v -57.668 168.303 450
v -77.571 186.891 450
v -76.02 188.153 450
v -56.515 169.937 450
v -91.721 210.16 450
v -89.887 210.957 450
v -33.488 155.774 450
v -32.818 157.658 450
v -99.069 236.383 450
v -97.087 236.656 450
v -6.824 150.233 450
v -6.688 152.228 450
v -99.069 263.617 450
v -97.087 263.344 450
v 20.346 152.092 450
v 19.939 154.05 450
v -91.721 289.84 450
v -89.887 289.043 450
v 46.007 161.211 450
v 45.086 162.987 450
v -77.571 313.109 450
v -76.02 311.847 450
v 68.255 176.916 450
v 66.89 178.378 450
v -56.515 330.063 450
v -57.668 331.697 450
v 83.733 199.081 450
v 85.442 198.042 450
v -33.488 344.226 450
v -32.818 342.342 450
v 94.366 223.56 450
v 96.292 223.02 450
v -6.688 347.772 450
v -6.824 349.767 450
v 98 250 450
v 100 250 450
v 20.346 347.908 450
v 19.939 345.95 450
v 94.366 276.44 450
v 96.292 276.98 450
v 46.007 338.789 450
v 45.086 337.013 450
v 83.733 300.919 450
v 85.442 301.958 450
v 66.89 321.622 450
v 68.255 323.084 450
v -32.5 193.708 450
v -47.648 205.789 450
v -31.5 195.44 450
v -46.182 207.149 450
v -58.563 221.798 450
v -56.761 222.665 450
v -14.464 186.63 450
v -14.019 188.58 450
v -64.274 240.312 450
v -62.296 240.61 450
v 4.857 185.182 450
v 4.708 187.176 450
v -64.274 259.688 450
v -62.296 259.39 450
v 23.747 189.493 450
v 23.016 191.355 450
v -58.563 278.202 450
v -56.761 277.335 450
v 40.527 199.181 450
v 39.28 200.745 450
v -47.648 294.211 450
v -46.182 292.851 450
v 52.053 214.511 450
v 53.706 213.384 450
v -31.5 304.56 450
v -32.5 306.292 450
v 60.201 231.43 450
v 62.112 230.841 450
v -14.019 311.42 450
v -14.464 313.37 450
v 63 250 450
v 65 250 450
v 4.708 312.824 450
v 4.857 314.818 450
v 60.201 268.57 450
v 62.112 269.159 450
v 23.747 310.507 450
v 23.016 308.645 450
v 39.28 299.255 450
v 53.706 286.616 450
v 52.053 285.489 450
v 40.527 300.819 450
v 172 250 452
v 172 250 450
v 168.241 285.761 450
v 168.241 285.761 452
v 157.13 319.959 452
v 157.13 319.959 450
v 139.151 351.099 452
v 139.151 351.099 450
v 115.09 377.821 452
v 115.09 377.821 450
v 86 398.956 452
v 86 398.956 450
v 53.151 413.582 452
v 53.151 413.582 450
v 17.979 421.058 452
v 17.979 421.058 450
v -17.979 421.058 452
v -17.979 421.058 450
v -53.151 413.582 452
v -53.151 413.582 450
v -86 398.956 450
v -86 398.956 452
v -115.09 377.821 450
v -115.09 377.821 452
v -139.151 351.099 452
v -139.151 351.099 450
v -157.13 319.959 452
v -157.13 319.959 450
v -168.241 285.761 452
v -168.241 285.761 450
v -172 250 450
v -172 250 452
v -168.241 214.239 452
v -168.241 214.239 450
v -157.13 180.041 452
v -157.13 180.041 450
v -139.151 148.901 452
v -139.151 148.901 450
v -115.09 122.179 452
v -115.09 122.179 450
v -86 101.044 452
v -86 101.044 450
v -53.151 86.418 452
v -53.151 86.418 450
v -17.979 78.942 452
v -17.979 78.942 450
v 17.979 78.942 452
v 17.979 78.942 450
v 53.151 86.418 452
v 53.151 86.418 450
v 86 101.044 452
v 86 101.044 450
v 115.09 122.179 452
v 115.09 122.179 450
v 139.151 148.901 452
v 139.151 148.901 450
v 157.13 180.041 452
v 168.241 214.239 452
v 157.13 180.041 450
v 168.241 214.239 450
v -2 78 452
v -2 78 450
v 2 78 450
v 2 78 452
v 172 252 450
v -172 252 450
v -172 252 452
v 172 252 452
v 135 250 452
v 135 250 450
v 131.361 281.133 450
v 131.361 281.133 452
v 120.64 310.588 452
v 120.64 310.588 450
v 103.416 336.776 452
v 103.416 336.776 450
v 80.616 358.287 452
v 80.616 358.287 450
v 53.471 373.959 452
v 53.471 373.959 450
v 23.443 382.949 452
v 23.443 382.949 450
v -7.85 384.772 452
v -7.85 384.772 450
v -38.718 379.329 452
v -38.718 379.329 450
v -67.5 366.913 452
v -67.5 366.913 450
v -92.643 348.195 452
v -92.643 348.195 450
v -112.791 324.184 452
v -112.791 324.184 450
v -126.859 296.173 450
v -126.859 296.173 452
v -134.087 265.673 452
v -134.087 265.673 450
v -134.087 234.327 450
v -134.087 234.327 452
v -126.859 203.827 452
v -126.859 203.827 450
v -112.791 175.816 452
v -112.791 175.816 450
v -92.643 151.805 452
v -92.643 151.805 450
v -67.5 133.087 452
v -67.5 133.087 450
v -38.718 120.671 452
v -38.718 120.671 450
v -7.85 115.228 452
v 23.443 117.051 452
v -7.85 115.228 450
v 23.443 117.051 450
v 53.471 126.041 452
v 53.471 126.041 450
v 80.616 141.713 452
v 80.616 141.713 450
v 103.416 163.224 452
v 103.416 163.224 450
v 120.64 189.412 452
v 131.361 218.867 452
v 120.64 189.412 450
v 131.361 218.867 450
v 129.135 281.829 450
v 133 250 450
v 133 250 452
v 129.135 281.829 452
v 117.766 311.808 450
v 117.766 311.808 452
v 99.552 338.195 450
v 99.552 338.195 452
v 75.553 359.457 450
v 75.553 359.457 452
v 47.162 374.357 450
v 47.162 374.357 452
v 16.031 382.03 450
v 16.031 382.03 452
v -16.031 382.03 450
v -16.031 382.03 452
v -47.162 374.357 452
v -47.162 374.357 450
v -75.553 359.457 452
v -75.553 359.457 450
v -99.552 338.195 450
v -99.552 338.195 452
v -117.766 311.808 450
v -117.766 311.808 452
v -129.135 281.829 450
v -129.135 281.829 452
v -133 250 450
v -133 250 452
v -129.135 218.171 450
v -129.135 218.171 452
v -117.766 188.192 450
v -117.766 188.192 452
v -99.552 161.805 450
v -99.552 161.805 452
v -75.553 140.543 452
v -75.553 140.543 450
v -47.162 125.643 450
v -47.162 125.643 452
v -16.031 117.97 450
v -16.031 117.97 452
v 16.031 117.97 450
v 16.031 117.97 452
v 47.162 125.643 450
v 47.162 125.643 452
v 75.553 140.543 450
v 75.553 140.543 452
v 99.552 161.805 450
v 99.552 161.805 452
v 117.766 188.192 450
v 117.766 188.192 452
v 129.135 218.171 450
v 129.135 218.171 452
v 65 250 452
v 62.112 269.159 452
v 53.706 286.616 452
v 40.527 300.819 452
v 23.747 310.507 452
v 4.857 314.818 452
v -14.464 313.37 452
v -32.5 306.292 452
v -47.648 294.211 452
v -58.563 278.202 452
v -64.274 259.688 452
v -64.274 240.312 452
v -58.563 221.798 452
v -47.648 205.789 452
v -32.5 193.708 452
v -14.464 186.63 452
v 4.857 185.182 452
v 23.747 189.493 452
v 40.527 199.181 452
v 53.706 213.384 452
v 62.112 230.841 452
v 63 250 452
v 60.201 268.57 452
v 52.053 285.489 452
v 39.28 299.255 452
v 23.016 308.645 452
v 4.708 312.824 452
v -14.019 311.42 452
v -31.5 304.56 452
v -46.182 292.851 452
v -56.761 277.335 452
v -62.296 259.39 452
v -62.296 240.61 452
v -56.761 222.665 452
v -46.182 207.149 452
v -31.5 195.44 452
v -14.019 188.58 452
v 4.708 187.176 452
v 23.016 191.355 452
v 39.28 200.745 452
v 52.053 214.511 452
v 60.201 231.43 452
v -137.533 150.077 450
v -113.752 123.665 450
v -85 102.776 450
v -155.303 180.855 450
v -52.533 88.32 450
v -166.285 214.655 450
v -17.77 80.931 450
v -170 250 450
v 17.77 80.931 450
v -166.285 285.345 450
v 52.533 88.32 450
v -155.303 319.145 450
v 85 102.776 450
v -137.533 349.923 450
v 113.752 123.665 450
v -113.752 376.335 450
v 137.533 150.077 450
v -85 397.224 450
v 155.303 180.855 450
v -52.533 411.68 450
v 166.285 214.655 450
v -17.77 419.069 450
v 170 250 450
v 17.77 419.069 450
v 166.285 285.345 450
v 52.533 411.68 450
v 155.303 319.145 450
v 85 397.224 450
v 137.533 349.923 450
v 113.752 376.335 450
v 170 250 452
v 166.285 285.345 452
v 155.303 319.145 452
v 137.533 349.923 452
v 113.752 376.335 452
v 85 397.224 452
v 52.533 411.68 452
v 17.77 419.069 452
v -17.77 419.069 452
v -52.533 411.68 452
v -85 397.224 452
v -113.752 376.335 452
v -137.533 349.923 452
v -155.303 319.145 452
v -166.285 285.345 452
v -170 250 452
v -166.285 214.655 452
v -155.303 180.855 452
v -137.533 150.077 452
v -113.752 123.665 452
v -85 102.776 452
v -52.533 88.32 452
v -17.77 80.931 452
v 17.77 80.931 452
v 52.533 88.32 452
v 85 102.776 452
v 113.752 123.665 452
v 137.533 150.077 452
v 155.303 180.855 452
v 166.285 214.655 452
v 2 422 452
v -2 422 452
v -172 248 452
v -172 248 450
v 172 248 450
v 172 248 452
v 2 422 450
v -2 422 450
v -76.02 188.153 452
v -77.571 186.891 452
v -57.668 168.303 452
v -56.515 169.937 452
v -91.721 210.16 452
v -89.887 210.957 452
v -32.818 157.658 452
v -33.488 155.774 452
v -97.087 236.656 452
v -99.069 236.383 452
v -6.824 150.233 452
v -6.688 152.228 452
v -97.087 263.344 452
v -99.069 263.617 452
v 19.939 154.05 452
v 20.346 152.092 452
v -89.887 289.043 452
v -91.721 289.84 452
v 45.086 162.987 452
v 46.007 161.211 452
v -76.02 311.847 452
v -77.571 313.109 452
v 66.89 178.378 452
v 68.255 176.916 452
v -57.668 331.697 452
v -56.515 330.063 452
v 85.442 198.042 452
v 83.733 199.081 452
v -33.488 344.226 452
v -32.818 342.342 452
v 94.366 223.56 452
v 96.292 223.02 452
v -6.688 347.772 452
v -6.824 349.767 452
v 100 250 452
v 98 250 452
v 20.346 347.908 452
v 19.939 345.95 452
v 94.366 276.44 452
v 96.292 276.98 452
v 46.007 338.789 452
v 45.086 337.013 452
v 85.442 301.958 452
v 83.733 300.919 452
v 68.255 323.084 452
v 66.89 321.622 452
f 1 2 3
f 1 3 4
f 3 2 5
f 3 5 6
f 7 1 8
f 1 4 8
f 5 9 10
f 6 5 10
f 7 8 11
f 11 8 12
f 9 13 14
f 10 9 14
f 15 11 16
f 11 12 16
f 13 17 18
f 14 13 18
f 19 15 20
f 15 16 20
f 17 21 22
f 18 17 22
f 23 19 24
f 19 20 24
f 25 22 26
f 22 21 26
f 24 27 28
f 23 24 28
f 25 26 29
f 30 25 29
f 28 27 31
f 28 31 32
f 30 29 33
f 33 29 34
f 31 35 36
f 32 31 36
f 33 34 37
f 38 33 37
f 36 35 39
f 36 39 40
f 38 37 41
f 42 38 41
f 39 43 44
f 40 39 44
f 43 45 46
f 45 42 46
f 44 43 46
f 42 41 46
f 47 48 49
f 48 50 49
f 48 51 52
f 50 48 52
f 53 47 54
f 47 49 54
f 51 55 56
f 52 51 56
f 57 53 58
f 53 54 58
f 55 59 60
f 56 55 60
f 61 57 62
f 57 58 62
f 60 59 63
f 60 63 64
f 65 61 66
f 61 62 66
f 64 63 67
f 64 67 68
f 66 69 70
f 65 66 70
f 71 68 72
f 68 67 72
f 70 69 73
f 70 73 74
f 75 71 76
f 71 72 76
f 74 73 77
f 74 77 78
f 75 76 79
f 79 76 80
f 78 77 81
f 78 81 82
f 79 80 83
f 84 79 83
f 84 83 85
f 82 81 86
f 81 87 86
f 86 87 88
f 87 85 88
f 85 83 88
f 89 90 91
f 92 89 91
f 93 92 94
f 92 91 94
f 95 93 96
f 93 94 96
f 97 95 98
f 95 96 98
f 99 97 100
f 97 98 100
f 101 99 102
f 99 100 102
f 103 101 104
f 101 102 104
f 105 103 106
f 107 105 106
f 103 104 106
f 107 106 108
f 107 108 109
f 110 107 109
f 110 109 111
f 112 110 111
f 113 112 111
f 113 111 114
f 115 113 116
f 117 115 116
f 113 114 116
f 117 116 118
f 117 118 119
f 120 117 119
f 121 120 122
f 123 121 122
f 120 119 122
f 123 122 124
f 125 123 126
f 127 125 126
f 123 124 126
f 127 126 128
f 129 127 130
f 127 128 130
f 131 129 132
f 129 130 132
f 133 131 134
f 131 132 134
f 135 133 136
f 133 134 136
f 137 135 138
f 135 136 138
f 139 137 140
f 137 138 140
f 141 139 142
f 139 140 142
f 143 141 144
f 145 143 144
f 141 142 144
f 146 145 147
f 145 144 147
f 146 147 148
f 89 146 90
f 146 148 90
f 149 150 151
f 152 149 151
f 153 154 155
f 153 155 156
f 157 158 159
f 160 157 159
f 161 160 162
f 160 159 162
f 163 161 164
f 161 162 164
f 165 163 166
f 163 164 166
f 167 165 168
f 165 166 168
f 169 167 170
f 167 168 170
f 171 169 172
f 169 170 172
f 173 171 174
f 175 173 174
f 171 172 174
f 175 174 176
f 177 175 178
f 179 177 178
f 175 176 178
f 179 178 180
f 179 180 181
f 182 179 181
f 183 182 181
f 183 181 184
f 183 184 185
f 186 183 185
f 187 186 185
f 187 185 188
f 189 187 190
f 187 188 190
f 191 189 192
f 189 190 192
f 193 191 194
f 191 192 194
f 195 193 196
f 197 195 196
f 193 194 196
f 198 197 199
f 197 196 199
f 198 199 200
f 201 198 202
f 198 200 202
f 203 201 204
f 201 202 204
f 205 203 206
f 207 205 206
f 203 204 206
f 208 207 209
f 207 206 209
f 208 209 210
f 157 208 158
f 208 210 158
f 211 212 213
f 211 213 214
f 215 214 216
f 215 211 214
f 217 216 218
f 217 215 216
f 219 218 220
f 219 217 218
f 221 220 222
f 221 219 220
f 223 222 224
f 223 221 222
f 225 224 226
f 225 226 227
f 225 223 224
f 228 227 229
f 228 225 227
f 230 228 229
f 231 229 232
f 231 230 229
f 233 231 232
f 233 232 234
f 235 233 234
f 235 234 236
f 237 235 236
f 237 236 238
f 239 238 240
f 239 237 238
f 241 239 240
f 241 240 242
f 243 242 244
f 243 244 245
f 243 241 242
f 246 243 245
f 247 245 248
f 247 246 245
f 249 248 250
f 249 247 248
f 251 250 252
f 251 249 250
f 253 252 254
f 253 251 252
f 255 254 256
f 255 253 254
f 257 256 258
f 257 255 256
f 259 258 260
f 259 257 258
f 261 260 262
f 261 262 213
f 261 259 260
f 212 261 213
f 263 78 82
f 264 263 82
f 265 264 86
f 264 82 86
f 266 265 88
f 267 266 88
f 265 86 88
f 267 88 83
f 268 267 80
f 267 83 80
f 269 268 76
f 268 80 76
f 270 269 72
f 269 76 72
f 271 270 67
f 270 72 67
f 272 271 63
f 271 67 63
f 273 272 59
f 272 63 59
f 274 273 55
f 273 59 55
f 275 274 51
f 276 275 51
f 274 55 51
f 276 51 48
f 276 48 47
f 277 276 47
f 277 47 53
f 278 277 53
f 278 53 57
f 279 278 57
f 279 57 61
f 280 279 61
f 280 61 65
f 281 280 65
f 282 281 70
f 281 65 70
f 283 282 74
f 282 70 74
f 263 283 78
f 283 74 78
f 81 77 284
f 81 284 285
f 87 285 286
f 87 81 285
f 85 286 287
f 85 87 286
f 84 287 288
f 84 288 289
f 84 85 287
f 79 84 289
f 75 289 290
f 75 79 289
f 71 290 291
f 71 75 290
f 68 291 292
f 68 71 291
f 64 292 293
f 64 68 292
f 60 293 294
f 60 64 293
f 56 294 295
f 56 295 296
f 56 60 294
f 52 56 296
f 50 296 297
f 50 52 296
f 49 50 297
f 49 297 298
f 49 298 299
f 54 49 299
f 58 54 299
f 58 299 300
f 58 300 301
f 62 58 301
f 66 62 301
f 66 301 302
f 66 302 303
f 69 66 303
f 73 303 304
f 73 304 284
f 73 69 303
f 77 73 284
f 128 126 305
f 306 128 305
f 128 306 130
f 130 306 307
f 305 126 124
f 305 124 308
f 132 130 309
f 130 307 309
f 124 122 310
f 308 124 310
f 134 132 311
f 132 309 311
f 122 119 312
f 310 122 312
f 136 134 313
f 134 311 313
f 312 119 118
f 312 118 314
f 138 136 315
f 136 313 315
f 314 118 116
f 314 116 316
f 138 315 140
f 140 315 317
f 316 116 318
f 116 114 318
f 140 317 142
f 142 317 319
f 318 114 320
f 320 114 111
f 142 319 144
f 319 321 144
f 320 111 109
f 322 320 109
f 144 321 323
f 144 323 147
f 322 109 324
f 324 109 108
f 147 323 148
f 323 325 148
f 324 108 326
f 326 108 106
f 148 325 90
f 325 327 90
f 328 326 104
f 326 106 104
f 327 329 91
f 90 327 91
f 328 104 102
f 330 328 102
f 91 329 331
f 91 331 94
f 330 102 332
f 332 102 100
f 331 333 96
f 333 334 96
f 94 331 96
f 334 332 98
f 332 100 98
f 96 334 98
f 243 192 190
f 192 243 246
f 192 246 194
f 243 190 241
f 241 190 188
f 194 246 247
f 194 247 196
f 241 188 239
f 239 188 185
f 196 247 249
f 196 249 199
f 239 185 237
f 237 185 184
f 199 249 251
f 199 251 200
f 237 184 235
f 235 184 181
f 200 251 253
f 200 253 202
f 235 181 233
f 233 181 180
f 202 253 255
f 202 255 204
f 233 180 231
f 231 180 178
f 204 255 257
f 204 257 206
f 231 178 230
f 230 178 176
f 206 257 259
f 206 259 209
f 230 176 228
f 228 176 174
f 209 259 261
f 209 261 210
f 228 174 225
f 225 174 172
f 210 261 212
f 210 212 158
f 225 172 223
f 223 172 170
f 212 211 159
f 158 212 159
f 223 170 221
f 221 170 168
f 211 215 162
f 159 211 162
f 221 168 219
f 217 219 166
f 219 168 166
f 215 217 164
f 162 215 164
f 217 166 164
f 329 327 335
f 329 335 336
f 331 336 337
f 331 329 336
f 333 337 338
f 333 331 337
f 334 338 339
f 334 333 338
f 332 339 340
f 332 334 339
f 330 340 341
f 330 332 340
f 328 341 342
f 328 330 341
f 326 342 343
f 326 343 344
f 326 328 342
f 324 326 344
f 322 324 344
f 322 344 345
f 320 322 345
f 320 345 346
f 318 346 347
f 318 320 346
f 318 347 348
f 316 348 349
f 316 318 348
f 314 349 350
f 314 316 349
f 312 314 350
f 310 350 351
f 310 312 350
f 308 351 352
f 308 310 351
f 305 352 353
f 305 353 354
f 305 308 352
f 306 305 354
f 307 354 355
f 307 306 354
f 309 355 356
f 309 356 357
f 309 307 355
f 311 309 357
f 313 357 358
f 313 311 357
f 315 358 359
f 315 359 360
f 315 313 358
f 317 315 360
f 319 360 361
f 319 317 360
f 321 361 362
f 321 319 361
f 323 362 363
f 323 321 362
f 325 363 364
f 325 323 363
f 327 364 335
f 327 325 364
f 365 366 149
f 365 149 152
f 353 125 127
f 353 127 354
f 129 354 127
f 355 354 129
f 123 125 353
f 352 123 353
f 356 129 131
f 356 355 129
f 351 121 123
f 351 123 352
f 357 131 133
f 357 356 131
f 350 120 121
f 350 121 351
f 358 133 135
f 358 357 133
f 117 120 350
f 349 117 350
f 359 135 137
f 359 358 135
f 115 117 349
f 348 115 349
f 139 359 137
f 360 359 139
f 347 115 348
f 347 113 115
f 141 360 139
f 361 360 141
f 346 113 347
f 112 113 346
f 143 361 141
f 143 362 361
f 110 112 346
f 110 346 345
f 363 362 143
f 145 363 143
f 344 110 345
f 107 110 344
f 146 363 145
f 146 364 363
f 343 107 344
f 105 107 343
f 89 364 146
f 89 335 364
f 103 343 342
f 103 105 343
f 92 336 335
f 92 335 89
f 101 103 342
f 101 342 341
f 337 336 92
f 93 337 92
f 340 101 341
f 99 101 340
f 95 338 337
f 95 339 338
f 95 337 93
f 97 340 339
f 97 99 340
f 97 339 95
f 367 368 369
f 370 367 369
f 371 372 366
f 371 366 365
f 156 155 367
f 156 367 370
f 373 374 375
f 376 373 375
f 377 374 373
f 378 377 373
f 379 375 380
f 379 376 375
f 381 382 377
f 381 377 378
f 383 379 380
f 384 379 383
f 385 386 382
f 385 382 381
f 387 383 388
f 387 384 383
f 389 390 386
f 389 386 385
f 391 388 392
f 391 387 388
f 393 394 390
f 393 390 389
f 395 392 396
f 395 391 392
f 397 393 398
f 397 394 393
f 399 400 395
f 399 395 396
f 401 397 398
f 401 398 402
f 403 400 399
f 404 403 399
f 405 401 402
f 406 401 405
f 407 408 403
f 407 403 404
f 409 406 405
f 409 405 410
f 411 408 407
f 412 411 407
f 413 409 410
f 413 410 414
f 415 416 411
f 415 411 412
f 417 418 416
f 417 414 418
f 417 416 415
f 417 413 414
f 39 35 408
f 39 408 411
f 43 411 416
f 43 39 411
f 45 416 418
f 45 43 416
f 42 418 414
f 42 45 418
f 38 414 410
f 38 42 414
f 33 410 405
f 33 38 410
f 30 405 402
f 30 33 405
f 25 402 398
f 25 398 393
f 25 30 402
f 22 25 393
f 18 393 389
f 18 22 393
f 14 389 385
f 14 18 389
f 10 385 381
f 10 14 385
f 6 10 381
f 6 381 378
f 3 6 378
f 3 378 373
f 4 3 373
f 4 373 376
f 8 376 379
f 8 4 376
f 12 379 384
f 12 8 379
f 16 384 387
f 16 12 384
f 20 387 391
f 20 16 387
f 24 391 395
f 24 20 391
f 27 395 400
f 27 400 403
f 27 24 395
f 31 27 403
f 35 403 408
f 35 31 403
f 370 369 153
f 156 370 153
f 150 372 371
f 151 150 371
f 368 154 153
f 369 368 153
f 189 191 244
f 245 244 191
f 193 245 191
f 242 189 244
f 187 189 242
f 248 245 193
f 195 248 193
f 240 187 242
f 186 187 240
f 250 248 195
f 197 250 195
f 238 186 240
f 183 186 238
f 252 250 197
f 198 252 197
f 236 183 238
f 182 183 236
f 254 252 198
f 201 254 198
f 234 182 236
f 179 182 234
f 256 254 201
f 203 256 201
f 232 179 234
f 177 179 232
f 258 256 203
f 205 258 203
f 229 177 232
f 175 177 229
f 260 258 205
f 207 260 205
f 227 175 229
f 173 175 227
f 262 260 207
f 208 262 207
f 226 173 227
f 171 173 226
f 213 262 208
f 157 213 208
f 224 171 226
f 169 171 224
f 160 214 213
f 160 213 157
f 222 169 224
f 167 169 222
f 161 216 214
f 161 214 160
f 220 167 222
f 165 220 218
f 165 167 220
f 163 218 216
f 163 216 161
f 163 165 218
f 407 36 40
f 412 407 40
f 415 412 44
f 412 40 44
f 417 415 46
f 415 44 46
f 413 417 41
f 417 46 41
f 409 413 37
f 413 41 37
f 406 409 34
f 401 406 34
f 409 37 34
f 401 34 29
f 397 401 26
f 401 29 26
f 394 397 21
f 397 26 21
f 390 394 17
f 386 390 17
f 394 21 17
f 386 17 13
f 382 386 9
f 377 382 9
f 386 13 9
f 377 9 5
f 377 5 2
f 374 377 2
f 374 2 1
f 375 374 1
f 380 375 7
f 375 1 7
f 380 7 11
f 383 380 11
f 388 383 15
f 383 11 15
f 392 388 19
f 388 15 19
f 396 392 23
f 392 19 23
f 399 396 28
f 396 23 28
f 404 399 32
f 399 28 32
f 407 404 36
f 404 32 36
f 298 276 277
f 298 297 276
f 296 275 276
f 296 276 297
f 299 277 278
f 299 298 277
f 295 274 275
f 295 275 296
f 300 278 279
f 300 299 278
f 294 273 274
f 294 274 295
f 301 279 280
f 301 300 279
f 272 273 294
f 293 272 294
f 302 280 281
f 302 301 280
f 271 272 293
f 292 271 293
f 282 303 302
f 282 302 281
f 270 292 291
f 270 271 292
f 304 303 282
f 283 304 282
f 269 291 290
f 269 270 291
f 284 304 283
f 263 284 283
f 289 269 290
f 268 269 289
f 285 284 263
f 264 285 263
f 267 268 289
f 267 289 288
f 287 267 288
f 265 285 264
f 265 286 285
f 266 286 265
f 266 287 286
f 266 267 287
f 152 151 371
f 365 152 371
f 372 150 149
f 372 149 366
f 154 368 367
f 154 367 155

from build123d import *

# Parameters (mm, degrees)
GUARD_RING_ASSUMED_START        = 450
SKETCH1_R                       = 65
SKETCH1_R_2                     = 63
GUARD_RING_ASSUMED_DEPTH        = 2
BOSS_EXTRUDE2_START             = 450
SKETCH2_R                       = 100
SKETCH2_R_2                     = 98
BOSS_EXTRUDE2_DEPTH             = 2
BOSS_EXTRUDE3_START             = 450
SKETCH3_R                       = 135
SKETCH3_R_2                     = 133
BOSS_EXTRUDE3_DEPTH             = 2
BOSS_EXTRUDE4_START             = 450
SKETCH4_R                       = 172
SKETCH4_R_2                     = 170
BOSS_EXTRUDE4_DEPTH             = 2
GUARD_CROSSBAR_HORIZONTAL_START = 450
SKETCH5_W                       = 344
SKETCH5_H                       = 4
GUARD_CROSSBAR_HORIZONTAL_DEPTH = 2
GUARD_CROSSBAR_VERTICAL_START   = 450
SKETCH6_W                       = 4
SKETCH6_H                       = 344
GUARD_CROSSBAR_VERTICAL_DEPTH   = 2


with BuildPart() as part:
    # Sketch1 → Guard_ring_ASSUMED (new body)
    with BuildSketch(Plane.XY.offset(GUARD_RING_ASSUMED_START)):
        with Locations((0, 250)):
            Circle(SKETCH1_R)
        with Locations((0, 250)):
            Circle(SKETCH1_R_2, mode=Mode.SUBTRACT)
    extrude(amount=GUARD_RING_ASSUMED_DEPTH)


with BuildPart() as body_2:
    # Sketch2 → Boss-Extrude2 (new body)
    with BuildSketch(Plane.XY.offset(BOSS_EXTRUDE2_START)):
        with Locations((0, 250)):
            Circle(SKETCH2_R)
        with Locations((0, 250)):
            Circle(SKETCH2_R_2, mode=Mode.SUBTRACT)
    extrude(amount=BOSS_EXTRUDE2_DEPTH)


with BuildPart() as body_3:
    # Sketch3 → Boss-Extrude3 (new body)
    with BuildSketch(Plane.XY.offset(BOSS_EXTRUDE3_START)):
        with Locations((0, 250)):
            Circle(SKETCH3_R)
        with Locations((0, 250)):
            Circle(SKETCH3_R_2, mode=Mode.SUBTRACT)
    extrude(amount=BOSS_EXTRUDE3_DEPTH)


with BuildPart() as body_4:
    # Sketch4 → Boss-Extrude4 (new body)
    with BuildSketch(Plane.XY.offset(BOSS_EXTRUDE4_START)):
        with Locations((0, 250)):
            Circle(SKETCH4_R)
        with Locations((0, 250)):
            Circle(SKETCH4_R_2, mode=Mode.SUBTRACT)
    extrude(amount=BOSS_EXTRUDE4_DEPTH)


with BuildPart() as body_5:
    # Sketch5 → Guard_crossbar_horizontal (new body)
    with BuildSketch(Plane.XY.offset(GUARD_CROSSBAR_HORIZONTAL_START)):
        with Locations((0, 250)):
            Rectangle(SKETCH5_W, SKETCH5_H)
    extrude(amount=GUARD_CROSSBAR_HORIZONTAL_DEPTH)


with BuildPart() as body_6:
    # Sketch6 → Guard_crossbar_vertical (new body)
    with BuildSketch(Plane.XY.offset(GUARD_CROSSBAR_VERTICAL_START)):
        with Locations((0, 250)):
            Rectangle(SKETCH6_W, SKETCH6_H)
    extrude(amount=GUARD_CROSSBAR_VERTICAL_DEPTH)


solid = Compound([part.part, body_2.part, body_3.part, body_4.part, body_5.part, body_6.part])
